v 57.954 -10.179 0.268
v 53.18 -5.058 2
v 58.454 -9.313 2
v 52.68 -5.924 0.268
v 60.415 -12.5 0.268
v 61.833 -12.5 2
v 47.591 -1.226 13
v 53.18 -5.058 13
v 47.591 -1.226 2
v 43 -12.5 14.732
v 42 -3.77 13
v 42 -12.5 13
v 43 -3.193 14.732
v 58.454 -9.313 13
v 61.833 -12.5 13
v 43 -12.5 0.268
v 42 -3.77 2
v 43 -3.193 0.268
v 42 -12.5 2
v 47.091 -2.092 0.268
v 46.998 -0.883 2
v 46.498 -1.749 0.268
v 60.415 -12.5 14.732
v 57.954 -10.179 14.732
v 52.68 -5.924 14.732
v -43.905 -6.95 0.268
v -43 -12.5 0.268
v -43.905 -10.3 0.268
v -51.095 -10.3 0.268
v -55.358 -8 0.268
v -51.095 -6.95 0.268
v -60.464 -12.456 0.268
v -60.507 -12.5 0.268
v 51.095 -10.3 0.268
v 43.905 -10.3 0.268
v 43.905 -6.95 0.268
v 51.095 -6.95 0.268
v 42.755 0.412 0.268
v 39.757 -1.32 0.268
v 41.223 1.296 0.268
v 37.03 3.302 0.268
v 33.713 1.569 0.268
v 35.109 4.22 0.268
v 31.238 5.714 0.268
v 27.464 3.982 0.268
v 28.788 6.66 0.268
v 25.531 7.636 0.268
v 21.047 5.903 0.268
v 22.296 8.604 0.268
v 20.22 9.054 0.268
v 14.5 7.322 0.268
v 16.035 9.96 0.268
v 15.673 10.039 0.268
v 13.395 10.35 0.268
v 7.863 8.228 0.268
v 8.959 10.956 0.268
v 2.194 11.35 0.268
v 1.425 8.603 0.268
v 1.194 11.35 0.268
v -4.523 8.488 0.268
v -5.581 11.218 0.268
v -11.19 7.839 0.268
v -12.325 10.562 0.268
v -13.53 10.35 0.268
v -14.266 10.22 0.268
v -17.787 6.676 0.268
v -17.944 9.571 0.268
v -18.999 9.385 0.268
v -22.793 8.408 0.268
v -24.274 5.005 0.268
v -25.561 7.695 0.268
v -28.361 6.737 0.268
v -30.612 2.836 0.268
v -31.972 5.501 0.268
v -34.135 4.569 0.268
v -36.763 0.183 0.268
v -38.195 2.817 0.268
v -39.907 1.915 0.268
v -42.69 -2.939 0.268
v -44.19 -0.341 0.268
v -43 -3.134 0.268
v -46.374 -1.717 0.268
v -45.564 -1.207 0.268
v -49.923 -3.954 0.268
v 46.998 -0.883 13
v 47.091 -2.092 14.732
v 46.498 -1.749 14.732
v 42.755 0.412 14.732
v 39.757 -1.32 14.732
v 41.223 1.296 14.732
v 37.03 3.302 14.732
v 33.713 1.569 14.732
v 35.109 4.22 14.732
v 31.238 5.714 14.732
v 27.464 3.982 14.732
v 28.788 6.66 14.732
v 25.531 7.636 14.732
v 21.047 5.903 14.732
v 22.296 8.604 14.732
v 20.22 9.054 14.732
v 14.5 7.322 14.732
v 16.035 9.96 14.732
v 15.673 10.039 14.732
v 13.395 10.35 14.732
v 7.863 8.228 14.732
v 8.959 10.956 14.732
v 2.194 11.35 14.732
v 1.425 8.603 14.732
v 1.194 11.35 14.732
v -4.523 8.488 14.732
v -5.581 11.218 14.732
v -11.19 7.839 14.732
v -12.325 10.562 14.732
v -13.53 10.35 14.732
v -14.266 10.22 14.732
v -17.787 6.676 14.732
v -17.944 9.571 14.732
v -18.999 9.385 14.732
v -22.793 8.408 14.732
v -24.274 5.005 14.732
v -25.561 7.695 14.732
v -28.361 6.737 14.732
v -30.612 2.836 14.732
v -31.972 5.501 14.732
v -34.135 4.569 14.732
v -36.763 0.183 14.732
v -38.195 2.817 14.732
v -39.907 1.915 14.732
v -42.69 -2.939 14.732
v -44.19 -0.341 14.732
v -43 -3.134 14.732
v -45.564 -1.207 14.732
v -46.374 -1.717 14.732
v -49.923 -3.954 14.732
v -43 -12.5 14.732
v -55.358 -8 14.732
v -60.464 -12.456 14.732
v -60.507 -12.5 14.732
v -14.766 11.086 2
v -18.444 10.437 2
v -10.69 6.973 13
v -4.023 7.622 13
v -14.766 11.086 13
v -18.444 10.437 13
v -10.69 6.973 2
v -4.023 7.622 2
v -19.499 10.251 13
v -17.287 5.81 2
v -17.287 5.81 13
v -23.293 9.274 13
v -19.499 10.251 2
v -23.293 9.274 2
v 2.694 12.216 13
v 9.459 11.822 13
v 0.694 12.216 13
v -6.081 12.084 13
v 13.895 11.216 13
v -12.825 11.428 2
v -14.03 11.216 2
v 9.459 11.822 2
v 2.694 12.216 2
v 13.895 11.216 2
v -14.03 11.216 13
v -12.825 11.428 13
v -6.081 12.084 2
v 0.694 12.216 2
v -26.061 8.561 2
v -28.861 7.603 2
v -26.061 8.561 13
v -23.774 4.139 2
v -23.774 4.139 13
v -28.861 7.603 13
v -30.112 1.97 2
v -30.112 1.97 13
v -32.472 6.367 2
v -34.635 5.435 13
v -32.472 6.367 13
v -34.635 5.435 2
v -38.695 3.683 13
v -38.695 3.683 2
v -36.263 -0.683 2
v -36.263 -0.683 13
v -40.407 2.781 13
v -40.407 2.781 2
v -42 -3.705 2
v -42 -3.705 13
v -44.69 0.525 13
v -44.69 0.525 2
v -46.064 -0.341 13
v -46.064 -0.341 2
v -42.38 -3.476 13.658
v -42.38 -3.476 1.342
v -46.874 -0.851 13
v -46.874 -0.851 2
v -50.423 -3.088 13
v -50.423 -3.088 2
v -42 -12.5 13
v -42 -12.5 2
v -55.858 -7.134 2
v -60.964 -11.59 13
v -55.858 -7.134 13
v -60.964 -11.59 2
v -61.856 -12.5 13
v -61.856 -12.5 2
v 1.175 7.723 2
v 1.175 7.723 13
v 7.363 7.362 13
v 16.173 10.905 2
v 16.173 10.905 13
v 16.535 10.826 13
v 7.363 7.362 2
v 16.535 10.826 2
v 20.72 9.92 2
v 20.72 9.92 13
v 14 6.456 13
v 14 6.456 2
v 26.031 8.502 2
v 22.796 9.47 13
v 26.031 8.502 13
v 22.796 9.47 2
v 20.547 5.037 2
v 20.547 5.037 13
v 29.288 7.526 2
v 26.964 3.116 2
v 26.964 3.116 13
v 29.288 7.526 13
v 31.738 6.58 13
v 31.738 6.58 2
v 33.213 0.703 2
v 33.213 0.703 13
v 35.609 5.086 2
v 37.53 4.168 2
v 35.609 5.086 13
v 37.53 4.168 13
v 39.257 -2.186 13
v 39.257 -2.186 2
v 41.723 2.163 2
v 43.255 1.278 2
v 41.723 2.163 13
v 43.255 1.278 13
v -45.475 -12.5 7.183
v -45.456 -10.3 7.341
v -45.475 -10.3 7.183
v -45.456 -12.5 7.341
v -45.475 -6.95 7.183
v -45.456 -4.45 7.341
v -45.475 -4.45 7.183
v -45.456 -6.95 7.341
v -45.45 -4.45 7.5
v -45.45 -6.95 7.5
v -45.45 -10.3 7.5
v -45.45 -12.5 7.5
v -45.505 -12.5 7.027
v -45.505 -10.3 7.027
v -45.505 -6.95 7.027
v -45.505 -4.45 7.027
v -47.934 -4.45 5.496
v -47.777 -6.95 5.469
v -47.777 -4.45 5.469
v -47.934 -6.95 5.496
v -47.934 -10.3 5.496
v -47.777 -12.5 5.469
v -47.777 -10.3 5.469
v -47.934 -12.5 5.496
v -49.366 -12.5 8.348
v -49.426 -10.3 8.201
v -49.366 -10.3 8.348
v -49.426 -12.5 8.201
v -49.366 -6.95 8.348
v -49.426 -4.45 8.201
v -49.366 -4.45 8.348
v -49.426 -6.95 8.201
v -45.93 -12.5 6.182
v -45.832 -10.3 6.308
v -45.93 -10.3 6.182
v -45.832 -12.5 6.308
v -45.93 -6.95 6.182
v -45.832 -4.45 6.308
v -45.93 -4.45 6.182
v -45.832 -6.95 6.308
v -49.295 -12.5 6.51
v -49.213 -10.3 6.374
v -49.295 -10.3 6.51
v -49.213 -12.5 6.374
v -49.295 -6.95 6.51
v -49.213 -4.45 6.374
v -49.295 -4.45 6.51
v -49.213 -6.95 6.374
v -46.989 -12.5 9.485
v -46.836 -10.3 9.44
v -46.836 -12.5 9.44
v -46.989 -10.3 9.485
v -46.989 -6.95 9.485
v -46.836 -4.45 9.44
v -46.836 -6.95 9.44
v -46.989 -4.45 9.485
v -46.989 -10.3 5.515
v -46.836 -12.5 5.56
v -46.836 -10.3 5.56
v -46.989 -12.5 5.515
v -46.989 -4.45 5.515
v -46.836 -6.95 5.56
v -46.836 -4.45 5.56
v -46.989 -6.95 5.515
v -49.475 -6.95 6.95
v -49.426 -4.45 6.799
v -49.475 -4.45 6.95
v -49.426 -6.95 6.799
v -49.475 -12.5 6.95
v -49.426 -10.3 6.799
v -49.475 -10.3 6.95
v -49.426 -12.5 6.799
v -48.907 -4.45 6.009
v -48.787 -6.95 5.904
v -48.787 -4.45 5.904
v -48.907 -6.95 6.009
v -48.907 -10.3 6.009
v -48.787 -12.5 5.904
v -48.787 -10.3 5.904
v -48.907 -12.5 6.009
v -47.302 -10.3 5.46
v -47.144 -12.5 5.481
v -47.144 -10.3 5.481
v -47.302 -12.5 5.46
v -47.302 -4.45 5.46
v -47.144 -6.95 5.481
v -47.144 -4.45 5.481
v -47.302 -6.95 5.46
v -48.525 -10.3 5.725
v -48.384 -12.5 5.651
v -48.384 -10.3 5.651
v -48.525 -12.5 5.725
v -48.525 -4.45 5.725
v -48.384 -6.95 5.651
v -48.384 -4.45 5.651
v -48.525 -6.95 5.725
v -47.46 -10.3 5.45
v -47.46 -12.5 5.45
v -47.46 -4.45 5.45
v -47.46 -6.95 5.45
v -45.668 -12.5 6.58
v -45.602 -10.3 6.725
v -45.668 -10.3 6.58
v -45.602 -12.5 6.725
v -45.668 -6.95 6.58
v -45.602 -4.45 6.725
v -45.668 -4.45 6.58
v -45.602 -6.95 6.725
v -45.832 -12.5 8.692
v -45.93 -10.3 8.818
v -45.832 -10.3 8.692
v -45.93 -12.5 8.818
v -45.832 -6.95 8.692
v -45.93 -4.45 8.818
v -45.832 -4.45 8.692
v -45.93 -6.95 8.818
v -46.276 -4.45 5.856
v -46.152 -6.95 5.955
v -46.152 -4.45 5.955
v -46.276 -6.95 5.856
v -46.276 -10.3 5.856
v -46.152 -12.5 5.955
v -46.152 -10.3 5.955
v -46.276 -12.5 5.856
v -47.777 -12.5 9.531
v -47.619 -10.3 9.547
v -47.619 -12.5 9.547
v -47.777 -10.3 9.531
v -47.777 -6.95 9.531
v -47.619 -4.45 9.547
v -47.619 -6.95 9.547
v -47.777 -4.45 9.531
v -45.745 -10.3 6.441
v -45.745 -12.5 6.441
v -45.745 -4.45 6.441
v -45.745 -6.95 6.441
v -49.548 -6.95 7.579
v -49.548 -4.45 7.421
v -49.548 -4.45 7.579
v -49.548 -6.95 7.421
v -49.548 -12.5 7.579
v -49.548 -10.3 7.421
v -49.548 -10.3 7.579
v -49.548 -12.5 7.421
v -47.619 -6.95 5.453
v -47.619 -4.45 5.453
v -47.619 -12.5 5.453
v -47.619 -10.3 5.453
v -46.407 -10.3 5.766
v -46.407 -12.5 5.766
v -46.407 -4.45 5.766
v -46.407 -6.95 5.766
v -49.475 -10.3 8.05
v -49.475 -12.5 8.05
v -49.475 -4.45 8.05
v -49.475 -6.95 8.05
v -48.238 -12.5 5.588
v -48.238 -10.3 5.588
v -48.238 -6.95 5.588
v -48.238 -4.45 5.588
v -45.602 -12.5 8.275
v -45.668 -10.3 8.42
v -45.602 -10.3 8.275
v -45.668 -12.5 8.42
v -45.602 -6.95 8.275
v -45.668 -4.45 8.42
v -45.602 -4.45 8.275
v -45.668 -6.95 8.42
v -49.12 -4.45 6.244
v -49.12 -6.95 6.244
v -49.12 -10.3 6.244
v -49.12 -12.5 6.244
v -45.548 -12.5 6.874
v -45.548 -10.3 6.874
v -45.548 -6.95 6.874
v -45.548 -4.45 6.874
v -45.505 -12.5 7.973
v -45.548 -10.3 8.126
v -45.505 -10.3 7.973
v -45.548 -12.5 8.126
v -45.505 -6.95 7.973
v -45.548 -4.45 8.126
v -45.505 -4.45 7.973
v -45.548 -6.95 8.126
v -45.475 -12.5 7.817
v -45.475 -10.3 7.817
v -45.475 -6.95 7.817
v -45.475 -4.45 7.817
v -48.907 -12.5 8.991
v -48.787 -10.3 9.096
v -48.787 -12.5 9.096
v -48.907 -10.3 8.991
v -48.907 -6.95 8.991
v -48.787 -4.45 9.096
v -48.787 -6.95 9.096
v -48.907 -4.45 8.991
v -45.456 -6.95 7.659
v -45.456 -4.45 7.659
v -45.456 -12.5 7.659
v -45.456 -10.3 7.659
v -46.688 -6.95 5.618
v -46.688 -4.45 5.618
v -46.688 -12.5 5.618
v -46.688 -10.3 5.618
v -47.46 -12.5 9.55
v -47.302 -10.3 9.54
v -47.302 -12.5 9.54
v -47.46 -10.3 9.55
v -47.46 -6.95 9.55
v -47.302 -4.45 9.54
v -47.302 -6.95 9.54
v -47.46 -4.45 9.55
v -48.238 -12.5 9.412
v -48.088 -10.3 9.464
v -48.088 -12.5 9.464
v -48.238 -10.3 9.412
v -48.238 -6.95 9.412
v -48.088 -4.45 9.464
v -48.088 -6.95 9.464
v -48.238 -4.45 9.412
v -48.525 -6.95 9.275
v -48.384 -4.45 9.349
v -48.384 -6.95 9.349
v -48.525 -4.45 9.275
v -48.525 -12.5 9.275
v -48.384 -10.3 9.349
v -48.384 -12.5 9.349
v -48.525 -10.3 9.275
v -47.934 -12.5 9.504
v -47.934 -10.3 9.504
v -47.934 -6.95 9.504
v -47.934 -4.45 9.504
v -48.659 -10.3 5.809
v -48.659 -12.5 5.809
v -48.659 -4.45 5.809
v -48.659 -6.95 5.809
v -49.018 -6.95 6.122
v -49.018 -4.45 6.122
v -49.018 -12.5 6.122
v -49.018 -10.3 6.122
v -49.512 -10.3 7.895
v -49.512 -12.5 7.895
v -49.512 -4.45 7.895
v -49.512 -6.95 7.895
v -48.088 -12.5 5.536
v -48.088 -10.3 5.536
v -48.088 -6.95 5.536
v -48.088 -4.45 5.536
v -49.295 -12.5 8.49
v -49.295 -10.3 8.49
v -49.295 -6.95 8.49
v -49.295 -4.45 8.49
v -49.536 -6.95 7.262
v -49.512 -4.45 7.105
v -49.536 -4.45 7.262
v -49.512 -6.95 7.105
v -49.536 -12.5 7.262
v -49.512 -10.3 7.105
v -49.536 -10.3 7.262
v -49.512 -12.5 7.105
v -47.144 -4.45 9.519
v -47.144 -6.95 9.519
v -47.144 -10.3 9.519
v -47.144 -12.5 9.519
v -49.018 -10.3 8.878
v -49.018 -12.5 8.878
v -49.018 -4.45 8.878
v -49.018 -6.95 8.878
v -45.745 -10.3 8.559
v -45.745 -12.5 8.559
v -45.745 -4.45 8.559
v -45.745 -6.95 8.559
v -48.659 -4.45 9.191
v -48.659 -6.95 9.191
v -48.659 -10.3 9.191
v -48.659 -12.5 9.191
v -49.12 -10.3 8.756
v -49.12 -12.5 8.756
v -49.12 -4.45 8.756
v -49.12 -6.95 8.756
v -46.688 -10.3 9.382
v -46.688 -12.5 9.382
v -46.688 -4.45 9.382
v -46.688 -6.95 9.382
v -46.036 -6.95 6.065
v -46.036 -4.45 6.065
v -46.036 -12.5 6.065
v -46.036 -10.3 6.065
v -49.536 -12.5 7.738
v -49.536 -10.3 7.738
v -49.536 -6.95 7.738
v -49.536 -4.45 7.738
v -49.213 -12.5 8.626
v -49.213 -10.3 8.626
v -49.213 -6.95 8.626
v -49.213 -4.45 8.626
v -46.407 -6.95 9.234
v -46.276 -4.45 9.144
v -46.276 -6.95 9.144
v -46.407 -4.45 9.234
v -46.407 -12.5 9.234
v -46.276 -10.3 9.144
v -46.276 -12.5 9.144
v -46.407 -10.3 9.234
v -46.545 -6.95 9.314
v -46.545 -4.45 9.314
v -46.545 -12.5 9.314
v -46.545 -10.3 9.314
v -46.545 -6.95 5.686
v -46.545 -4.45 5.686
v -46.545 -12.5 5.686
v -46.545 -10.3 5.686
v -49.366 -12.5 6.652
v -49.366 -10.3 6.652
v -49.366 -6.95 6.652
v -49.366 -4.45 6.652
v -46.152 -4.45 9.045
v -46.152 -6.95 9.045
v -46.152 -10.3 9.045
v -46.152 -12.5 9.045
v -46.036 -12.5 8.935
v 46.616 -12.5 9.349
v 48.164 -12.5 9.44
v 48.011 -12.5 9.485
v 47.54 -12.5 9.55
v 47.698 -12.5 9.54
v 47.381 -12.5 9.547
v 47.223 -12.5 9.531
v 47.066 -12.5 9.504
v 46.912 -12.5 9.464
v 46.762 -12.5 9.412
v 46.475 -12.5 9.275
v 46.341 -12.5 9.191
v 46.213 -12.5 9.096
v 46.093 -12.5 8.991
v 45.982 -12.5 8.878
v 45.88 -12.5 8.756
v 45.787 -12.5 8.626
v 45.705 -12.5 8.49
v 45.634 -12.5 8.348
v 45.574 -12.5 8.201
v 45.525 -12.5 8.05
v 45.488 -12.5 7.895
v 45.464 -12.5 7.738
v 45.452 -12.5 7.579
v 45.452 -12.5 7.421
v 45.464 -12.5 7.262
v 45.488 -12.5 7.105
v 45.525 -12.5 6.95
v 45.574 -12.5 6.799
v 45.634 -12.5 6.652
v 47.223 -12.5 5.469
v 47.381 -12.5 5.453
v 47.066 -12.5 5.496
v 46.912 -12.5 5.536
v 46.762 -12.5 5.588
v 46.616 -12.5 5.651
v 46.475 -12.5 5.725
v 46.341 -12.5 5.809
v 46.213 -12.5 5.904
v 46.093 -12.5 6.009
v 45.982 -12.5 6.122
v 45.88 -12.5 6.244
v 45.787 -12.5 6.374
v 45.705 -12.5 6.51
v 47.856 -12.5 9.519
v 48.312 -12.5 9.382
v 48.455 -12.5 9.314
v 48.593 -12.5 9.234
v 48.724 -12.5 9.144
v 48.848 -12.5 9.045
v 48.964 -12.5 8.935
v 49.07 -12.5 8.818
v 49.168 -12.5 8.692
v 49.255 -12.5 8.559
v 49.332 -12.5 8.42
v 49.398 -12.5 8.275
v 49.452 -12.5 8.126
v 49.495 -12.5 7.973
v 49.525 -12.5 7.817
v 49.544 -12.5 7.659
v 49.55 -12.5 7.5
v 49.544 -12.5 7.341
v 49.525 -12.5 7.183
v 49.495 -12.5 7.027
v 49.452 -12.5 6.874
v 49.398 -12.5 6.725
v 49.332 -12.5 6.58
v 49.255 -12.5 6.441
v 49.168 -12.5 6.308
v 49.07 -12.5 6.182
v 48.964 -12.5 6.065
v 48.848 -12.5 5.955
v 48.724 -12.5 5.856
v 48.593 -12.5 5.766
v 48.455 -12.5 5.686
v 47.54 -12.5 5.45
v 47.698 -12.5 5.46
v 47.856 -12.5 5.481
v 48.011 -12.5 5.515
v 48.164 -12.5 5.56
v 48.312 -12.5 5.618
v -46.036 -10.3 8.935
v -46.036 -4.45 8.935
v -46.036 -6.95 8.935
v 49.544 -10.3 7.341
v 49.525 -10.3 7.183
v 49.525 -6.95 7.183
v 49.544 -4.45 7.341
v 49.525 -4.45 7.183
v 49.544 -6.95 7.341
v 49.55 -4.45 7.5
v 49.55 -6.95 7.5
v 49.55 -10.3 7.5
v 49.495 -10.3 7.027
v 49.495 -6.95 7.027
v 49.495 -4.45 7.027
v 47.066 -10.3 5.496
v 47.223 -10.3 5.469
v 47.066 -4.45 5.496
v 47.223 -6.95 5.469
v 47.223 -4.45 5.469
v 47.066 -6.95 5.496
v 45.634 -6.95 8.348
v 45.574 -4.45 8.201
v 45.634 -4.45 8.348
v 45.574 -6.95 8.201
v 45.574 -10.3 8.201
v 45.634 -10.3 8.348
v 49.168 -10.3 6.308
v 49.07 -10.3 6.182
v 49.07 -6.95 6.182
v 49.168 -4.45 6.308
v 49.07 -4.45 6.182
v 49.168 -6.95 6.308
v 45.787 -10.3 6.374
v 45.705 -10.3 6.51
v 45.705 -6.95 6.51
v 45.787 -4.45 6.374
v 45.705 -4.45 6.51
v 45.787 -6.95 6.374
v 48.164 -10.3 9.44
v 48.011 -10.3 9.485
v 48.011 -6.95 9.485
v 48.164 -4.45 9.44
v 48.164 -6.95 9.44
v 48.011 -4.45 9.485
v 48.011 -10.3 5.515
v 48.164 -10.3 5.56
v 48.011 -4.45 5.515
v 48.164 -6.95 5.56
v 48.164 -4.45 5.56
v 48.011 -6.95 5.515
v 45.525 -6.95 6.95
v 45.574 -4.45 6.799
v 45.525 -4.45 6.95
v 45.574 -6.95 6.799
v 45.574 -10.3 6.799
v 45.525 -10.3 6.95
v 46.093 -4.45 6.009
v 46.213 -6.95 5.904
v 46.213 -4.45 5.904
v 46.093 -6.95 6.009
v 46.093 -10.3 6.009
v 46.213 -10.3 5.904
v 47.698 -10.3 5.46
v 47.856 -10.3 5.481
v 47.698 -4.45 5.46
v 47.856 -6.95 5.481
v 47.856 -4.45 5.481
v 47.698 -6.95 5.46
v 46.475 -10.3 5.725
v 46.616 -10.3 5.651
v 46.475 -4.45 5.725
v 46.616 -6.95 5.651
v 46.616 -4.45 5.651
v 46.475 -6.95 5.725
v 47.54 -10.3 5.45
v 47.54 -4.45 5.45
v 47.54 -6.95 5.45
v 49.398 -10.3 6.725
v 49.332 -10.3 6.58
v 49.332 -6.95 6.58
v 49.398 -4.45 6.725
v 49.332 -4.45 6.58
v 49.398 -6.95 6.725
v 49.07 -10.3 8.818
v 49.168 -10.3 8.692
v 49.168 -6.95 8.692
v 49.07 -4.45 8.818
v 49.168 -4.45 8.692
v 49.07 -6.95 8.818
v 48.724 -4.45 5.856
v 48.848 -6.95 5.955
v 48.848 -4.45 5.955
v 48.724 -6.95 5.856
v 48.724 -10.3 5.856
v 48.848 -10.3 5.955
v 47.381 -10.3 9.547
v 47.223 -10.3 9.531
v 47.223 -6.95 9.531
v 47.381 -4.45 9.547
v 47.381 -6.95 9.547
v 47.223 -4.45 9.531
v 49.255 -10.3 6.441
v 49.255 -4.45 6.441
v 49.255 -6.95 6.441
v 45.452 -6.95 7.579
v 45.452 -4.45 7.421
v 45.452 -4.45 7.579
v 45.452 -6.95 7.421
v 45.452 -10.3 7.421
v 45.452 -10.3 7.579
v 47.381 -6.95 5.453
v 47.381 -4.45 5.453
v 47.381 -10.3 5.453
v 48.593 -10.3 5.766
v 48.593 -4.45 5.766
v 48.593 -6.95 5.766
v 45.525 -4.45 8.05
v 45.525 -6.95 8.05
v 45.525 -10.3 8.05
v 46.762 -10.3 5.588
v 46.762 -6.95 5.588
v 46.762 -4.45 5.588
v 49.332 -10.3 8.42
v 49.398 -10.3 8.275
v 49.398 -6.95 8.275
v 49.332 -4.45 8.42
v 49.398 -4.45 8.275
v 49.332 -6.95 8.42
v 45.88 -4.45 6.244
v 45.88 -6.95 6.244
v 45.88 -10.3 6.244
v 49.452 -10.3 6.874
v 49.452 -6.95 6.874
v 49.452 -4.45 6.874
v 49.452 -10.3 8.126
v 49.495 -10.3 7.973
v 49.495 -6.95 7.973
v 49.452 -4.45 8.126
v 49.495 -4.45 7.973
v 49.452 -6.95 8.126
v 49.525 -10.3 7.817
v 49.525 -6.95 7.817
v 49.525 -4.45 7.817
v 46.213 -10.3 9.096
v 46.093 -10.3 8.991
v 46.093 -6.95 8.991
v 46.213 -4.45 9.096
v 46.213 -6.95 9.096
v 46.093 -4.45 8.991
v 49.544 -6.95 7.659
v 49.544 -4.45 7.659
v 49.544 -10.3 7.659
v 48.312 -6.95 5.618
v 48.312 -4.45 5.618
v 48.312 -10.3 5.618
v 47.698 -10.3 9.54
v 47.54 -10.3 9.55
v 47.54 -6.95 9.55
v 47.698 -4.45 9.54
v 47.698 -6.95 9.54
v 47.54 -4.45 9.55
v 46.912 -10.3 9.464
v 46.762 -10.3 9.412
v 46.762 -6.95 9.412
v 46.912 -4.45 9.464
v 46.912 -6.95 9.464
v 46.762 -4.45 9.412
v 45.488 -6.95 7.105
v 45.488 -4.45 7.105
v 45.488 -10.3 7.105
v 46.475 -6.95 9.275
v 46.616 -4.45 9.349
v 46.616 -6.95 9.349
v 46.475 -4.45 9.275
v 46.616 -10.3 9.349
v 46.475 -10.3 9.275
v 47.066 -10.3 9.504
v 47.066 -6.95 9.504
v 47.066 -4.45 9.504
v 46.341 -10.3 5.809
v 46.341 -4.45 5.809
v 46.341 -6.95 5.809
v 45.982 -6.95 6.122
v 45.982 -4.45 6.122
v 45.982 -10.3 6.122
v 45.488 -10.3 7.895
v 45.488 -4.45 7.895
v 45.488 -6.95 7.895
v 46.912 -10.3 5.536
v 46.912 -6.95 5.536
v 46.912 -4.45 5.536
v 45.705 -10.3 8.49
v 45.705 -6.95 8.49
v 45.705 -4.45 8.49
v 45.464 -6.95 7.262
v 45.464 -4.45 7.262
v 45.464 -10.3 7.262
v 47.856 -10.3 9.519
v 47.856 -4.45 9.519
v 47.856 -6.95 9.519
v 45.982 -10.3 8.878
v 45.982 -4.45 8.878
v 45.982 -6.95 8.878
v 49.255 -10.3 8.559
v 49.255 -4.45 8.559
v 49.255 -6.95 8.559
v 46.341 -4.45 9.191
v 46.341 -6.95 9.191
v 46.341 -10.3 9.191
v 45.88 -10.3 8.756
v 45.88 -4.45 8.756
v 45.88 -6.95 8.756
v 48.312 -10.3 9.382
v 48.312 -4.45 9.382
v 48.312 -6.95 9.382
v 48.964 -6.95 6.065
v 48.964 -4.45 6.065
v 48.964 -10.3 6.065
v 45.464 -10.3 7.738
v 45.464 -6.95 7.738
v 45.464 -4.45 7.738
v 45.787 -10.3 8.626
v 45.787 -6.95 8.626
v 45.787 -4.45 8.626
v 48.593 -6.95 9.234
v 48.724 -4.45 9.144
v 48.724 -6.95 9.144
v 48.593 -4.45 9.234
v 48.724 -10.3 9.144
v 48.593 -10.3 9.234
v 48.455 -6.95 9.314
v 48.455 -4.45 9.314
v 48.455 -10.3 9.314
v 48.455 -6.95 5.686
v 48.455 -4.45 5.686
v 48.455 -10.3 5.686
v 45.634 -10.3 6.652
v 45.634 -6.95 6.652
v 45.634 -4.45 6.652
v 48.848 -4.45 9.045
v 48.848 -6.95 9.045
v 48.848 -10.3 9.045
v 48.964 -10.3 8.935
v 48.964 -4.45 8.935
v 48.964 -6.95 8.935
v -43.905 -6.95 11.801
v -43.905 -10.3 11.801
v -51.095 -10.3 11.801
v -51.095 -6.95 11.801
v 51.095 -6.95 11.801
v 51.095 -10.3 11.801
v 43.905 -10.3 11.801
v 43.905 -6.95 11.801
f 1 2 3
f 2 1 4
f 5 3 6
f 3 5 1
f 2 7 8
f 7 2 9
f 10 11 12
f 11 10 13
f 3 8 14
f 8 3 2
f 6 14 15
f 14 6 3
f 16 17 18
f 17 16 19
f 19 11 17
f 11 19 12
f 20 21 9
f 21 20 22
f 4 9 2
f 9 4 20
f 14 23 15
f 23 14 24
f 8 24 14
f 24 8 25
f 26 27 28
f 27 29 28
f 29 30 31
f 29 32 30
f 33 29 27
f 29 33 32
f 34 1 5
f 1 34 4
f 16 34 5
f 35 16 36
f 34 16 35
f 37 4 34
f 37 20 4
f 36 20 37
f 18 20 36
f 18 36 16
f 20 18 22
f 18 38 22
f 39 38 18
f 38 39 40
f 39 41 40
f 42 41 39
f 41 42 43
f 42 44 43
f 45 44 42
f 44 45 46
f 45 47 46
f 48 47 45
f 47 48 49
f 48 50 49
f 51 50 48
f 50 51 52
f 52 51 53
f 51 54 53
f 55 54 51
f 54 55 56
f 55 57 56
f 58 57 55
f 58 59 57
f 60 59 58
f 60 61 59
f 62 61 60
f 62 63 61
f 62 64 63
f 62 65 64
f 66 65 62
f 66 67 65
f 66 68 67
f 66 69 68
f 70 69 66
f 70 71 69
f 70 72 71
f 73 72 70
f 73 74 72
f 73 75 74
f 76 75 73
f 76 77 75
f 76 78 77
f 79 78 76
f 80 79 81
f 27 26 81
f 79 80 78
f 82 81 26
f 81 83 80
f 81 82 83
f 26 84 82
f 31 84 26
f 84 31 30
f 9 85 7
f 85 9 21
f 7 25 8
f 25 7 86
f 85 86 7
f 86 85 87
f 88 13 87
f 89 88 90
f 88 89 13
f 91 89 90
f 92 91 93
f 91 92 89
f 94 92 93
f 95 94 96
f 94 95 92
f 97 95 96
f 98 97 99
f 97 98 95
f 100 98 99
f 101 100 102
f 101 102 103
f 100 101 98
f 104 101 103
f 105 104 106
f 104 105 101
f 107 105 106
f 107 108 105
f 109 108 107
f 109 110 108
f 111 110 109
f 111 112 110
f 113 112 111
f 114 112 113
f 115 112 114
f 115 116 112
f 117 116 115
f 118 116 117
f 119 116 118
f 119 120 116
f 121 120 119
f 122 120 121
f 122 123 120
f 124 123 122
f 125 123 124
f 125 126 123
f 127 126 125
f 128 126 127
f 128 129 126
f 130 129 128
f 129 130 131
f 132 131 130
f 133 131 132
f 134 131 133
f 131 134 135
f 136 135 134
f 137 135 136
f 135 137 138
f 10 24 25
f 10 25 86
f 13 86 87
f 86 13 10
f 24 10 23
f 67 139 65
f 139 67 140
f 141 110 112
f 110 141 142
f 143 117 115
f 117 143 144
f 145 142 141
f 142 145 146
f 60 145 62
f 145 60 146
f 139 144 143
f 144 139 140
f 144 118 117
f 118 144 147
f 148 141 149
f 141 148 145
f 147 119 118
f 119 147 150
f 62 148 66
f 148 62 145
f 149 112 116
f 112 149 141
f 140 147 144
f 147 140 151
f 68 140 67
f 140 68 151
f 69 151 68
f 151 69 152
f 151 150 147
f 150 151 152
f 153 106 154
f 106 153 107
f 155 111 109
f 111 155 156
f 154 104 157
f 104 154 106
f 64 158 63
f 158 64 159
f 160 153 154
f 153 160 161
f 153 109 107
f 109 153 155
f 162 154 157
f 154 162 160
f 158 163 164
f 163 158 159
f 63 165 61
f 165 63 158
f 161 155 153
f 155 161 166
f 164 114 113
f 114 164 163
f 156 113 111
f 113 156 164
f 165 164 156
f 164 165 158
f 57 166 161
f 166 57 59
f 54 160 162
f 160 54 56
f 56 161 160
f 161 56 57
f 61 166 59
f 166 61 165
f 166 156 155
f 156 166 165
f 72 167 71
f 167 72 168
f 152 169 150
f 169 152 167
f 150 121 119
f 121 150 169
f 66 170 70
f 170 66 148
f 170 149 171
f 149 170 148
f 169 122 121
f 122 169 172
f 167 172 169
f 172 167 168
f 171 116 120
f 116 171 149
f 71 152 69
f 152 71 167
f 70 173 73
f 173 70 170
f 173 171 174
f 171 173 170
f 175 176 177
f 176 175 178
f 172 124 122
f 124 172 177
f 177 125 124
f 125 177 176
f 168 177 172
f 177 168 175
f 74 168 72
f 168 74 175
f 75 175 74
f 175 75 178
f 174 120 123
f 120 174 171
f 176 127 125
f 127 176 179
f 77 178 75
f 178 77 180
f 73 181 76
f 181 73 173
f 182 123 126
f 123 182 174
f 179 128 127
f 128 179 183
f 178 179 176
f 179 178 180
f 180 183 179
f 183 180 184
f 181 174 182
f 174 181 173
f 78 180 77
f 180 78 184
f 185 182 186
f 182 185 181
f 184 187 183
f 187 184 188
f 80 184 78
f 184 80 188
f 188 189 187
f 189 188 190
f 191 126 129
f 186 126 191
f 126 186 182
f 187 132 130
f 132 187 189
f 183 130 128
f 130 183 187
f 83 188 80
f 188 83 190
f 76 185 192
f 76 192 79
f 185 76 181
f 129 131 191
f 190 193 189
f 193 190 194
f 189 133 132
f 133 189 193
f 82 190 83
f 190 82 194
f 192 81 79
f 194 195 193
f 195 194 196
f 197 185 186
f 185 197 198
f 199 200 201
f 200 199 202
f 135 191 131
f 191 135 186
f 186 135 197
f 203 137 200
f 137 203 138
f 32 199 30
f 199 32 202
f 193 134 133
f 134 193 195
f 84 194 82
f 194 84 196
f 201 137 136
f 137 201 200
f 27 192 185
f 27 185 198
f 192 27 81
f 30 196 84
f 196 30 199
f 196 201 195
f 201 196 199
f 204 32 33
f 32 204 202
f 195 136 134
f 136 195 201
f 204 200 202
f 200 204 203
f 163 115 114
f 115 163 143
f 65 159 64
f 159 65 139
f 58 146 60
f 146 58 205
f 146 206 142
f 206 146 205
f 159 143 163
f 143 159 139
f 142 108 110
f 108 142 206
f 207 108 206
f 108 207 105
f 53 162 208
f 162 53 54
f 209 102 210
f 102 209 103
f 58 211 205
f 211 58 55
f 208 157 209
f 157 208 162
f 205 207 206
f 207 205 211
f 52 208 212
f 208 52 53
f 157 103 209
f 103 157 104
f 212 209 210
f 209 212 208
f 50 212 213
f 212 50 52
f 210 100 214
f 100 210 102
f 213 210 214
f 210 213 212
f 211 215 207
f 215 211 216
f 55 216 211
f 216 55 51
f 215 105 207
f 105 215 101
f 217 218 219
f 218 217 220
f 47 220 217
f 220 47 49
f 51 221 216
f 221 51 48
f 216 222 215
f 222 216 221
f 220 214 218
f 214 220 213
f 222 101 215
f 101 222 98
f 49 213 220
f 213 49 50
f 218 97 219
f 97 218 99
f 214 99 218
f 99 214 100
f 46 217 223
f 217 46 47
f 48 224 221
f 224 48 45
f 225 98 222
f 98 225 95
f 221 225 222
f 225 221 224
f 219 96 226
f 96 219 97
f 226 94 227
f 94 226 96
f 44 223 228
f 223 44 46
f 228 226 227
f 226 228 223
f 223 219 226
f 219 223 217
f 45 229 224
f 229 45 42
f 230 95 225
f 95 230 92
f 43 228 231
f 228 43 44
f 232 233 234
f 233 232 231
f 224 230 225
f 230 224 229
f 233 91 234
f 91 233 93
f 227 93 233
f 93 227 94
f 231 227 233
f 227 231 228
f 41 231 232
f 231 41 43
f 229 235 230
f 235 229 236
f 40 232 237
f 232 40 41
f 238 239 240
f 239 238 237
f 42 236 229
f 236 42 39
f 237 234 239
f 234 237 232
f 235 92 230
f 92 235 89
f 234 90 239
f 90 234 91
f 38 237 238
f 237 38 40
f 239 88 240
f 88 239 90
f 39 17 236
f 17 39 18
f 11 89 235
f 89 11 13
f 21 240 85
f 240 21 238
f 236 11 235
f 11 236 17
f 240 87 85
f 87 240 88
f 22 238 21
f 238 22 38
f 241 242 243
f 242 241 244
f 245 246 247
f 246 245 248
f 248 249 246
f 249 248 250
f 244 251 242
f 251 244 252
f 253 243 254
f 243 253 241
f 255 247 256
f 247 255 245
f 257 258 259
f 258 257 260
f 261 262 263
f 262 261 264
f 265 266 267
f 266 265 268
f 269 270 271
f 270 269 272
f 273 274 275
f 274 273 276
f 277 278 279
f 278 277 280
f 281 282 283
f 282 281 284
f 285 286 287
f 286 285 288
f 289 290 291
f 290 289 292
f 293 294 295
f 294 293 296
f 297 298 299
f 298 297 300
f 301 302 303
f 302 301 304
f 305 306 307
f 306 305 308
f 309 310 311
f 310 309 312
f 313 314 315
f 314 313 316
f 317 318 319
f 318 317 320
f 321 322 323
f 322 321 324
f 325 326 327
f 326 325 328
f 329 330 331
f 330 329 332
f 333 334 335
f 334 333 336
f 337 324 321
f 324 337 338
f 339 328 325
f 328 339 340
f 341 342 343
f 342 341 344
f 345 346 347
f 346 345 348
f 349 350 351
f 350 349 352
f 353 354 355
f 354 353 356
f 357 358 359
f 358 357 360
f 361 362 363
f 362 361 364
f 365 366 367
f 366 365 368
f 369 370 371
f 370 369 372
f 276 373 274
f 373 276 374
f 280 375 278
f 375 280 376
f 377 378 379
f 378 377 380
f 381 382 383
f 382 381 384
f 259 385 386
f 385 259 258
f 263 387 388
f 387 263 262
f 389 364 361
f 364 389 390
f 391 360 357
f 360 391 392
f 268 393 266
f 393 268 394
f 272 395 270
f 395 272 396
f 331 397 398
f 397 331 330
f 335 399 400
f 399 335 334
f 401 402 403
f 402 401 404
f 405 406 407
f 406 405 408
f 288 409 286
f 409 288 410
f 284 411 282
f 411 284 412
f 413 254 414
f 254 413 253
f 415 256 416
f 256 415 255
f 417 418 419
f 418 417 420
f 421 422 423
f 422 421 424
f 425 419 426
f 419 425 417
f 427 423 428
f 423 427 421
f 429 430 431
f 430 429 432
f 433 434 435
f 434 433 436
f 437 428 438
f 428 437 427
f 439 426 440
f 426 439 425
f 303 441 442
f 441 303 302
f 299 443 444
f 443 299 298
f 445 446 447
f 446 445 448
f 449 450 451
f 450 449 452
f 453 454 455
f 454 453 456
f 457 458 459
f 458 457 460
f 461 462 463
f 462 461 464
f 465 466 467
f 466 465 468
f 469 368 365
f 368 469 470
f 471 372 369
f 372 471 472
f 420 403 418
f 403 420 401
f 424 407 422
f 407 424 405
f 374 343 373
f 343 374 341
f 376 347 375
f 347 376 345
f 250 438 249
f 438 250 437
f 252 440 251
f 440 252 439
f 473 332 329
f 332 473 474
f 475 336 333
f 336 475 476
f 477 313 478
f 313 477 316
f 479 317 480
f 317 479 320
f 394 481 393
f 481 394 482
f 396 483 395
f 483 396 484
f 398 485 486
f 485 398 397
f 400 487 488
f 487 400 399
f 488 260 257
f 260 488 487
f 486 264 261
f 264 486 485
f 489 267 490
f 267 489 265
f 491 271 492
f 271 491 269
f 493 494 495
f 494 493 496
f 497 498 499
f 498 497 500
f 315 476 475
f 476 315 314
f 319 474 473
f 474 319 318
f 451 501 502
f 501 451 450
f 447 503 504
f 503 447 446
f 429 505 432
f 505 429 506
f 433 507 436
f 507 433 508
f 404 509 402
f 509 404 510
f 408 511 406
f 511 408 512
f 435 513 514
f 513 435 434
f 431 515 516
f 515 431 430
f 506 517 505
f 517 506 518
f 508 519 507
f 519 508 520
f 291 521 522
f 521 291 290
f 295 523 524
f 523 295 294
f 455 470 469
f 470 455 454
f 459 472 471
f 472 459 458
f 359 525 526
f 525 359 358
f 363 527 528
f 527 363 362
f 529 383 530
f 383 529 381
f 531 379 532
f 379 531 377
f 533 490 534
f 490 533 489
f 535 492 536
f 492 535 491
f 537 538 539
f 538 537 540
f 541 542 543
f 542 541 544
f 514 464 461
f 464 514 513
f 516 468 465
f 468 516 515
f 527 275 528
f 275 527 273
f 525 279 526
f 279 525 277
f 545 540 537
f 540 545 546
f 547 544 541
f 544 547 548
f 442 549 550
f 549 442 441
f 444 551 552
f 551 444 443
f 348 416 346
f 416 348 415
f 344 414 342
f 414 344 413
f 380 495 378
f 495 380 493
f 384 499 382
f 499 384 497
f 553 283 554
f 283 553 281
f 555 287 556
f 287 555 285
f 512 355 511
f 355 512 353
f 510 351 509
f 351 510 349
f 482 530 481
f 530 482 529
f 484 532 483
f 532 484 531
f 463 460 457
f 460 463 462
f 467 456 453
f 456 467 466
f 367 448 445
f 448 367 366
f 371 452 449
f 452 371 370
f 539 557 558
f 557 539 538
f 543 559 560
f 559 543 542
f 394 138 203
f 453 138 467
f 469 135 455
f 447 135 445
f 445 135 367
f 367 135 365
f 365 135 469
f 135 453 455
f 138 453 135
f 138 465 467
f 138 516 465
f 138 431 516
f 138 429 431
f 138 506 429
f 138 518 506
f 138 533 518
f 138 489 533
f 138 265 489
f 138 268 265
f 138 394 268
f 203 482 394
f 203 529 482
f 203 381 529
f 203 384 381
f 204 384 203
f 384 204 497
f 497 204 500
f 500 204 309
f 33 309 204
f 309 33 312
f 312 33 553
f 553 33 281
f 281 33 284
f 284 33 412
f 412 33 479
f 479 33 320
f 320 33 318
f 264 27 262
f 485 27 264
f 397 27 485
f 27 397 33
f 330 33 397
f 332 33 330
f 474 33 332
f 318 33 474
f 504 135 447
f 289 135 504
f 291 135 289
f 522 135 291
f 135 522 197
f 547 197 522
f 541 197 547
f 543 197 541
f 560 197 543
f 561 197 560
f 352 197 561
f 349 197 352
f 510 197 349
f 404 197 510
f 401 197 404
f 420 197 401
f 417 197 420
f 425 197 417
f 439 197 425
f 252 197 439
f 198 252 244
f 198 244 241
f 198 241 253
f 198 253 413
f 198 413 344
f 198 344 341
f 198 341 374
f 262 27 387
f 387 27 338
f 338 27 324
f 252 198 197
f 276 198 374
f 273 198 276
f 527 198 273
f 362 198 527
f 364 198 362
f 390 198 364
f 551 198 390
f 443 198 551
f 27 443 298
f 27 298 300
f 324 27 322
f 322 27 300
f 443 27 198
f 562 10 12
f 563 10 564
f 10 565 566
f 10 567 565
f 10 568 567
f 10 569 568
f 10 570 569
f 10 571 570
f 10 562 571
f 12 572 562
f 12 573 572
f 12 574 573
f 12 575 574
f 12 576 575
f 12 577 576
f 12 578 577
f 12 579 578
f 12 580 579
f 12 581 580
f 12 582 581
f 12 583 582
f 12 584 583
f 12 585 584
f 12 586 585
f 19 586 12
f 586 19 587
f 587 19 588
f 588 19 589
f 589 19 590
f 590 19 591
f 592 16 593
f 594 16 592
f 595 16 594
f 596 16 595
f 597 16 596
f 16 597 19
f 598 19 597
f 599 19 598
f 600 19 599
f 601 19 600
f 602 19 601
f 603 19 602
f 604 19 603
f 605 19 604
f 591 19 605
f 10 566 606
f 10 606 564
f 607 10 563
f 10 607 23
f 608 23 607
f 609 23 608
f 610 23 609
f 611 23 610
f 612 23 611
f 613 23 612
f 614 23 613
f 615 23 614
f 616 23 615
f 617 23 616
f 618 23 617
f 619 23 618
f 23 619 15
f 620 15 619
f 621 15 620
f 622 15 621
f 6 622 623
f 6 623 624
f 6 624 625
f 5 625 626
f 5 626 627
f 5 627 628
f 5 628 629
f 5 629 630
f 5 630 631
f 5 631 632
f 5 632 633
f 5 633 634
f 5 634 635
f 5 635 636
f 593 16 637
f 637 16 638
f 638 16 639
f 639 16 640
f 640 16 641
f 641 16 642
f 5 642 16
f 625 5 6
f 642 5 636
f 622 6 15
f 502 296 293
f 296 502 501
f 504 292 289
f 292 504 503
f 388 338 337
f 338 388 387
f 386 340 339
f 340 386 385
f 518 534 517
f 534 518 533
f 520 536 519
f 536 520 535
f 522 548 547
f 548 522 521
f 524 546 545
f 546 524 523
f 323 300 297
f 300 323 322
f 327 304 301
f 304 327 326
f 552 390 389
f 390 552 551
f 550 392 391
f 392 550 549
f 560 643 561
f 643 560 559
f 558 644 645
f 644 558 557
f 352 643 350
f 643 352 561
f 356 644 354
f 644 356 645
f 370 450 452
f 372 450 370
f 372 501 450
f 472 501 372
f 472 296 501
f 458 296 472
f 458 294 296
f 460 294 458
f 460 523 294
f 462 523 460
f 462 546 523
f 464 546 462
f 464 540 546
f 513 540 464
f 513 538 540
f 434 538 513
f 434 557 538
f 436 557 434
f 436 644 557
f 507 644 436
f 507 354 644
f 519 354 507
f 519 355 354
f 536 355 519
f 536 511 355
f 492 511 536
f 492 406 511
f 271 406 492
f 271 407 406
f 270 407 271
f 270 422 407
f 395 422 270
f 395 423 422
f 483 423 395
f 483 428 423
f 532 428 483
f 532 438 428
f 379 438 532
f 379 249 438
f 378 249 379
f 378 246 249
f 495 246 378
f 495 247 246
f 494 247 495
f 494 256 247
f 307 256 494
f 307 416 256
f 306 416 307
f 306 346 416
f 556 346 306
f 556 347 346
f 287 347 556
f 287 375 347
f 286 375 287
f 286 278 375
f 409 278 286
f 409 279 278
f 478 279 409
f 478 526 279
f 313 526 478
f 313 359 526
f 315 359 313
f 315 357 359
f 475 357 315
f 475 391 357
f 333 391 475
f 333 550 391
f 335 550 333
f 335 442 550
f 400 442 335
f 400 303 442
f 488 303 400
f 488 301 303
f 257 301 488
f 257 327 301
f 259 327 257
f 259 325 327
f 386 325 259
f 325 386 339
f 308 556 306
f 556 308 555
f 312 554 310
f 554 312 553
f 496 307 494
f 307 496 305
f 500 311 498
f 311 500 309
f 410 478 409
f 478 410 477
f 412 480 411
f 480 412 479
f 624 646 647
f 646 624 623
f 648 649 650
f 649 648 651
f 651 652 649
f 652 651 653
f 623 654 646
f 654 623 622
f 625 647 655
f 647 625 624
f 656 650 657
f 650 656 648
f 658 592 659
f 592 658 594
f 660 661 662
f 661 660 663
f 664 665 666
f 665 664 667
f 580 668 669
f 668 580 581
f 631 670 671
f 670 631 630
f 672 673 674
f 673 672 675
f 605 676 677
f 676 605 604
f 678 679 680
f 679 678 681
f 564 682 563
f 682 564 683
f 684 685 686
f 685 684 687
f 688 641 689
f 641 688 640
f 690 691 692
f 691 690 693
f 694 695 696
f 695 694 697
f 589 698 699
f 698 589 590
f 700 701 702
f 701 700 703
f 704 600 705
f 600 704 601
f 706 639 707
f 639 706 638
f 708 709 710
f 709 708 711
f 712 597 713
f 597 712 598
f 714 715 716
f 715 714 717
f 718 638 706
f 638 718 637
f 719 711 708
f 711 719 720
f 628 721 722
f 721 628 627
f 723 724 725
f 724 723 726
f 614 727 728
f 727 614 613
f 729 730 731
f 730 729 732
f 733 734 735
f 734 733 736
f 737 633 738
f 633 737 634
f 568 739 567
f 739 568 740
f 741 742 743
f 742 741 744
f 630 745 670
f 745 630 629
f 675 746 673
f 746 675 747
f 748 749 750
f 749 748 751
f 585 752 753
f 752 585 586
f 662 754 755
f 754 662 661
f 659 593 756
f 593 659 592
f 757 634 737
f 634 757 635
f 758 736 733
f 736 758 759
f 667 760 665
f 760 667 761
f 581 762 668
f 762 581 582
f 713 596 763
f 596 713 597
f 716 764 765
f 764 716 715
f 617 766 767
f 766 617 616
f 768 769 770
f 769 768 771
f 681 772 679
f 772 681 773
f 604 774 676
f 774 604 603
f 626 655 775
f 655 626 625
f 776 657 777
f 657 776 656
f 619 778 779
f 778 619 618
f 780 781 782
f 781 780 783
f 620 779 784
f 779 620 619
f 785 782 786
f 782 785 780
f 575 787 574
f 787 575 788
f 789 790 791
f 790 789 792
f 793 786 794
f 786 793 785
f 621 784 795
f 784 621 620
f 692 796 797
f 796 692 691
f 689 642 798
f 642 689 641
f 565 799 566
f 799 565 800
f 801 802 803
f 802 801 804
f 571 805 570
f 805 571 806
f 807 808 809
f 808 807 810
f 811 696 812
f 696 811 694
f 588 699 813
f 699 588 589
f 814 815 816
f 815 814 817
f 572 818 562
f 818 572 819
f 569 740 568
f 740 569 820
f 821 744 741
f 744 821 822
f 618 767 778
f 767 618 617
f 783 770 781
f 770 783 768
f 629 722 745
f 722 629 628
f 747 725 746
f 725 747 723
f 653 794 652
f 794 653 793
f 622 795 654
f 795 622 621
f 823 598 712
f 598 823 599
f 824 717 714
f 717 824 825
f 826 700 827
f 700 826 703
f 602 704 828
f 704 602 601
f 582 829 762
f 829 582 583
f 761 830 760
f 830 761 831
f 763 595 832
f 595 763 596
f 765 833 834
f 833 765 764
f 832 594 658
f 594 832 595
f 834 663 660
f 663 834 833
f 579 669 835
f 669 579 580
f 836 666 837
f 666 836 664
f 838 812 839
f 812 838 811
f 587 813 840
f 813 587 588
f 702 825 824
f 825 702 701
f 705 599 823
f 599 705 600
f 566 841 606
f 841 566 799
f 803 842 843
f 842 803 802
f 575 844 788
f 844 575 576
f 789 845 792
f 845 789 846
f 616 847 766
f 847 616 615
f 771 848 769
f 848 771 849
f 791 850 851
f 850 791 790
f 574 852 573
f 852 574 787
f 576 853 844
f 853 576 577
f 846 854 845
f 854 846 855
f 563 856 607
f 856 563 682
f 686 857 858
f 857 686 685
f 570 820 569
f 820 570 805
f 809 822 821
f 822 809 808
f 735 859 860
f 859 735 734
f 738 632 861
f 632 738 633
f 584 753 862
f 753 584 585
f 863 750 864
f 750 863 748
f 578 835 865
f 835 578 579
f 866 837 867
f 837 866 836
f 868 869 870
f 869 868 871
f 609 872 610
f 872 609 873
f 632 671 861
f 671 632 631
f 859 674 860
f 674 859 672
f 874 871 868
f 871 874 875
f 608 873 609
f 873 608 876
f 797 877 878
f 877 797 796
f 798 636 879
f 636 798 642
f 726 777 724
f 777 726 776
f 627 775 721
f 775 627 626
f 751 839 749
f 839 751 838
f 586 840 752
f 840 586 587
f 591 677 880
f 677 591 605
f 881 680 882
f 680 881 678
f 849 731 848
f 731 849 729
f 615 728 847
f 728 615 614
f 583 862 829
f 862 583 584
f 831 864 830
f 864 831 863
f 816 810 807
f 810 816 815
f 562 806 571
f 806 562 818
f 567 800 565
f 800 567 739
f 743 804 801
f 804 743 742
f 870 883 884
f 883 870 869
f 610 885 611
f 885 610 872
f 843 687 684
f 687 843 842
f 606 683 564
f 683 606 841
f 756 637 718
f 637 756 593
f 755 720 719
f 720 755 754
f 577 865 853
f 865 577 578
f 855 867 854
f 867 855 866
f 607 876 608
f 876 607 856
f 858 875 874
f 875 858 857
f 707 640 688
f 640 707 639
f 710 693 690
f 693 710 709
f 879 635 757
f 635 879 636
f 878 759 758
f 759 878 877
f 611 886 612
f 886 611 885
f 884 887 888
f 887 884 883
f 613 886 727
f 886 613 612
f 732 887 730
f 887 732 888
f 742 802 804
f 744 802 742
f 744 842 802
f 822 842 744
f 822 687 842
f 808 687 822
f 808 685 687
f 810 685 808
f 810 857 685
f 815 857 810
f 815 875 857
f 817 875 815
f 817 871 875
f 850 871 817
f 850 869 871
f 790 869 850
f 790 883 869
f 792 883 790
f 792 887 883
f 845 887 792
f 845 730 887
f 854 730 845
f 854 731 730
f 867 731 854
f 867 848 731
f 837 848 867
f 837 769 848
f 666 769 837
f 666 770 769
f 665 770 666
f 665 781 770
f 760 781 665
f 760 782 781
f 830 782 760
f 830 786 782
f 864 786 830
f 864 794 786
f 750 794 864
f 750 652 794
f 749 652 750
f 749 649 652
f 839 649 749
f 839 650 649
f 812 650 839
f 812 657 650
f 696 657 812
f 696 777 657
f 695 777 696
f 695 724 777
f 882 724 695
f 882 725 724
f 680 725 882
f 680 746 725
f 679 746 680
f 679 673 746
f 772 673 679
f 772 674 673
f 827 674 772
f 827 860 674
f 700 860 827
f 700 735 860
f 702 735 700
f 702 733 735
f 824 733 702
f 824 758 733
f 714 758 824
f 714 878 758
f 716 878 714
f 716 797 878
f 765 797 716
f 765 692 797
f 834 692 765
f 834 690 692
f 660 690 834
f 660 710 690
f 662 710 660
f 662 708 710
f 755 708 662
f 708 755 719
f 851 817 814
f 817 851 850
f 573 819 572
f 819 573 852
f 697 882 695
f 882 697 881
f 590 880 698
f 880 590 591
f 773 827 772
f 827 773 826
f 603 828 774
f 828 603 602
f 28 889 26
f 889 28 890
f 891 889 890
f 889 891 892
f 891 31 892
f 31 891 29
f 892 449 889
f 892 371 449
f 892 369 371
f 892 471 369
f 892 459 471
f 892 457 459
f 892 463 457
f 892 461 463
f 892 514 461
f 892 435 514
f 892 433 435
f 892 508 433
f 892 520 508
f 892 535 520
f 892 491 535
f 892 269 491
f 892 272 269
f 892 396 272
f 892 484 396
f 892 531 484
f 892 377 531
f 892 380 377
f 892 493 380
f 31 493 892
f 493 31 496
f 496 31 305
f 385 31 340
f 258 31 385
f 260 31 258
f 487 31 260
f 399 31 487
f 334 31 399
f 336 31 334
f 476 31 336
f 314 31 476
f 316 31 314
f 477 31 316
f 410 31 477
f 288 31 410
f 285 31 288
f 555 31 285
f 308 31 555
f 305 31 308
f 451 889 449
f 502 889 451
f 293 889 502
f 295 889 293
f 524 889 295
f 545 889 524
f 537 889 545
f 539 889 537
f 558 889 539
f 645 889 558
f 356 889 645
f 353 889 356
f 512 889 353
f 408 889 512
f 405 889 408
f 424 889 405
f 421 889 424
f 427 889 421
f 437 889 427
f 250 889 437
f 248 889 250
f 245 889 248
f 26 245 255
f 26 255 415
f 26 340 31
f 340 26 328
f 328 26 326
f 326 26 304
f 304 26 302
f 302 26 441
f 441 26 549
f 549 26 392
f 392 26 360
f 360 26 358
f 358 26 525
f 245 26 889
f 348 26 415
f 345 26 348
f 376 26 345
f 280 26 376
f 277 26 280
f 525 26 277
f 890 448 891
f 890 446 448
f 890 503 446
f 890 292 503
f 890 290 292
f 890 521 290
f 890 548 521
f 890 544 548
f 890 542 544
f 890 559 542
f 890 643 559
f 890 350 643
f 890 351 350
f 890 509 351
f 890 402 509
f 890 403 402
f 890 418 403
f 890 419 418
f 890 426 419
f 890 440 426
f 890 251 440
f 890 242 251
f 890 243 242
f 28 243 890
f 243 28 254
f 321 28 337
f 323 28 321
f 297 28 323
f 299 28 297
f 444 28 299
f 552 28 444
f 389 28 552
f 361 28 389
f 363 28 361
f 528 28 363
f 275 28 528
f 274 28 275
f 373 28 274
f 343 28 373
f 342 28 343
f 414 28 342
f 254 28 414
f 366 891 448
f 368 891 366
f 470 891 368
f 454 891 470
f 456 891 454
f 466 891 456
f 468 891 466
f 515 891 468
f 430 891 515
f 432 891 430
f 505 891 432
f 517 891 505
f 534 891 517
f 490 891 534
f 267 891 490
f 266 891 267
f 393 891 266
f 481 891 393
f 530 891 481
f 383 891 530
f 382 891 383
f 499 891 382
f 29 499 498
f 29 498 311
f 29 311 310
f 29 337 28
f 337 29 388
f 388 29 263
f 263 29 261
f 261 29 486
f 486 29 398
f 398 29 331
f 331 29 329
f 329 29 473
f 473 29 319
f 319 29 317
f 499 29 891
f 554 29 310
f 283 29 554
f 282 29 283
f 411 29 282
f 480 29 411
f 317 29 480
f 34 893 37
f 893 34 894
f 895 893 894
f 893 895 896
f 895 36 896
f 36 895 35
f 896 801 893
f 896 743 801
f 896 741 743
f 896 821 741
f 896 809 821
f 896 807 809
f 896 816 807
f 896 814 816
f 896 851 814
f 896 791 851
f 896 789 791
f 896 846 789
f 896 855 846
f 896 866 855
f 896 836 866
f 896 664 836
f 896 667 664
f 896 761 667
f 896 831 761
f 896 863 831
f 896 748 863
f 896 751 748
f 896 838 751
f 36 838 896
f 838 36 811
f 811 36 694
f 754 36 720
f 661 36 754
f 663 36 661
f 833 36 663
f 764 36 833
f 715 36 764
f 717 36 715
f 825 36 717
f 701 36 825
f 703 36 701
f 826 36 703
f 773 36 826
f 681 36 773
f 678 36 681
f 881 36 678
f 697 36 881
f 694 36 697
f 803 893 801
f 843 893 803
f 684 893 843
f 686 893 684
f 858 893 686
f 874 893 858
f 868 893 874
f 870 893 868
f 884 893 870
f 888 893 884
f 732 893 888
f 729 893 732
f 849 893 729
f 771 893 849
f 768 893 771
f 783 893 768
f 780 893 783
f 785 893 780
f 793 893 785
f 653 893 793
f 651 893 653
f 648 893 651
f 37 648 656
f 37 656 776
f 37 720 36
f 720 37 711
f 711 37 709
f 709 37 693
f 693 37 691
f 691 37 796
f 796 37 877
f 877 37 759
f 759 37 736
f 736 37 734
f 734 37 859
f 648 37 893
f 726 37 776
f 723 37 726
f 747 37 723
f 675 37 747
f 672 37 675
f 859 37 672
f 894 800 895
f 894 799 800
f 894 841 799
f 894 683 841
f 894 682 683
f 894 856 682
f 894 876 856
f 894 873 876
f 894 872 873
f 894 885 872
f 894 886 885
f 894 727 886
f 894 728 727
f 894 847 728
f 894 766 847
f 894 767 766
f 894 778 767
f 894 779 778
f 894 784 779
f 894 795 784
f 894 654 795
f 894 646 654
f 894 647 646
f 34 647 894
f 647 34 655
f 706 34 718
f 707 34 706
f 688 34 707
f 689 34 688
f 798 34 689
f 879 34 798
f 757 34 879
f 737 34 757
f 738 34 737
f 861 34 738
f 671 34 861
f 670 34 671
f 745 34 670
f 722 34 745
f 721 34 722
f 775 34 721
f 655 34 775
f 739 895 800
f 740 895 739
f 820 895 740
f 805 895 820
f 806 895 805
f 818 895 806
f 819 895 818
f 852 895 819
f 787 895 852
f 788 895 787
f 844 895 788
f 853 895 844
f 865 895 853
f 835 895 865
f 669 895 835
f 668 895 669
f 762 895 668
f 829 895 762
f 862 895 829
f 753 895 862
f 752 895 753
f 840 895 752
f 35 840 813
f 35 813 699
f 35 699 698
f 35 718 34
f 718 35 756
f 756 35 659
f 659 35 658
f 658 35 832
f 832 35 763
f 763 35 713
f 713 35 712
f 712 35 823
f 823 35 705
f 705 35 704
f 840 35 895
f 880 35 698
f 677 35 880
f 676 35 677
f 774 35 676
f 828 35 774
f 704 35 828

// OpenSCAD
/* Cabinet/Drawer Handle
   by Lyl3

Create a simple circular arc shaped handle for cabinets, cupboards, or drawers.

This code is published at:
https://www.thingiverse.com/thing:3911914
licensed under the Creative Commons - Attribution - Share Alike license (CC BY-SA 3.0)

V0.1 - basic working prototype with math worked out
V0.2 - filleted edges
V0.3 - added screw hole and nut hole
V0.4 - fine-tuning, set sane ranges for parameters
V0.5 - added tolerance parameters for the holes
V0.6 - fine-tuned ranges
V0.7 - added parameter and code to create test piece instead of whole handle.
V0.8 - added parameter and code to create nut hole plugs
V1.0 - removed the brim from the nut hole plugs
       ready for release
V1.1 - set resolution based on length of arc      
V1.2 - fixed calcualtion for mount radius
V1.3 - mount plate extended across handle, option for single screw hole or two screw holes
V1.4 - fine-tuning the math, set sane parameter ranges
V1.5 - added "mount pillars" to the design, made code more efficient, fixed math bugs
V1.6 - simplified code using 2D instead of 3D for the handle profile
V1.7 - added spherical-shaped handle option, moved back of handle to XZ plane, simplifying transformations
V1.8 - backplate all the way across the back for spherical handles
V1.9 - scaled height to allow handles shaped like spheroid sections instead of spherical sections
V2.0 - used cavity length parameter for spheroidal handles
V2.1 - fixed documentation, default parameter values
*/

/* [Handle parameters] */

// Resolution of arcs and circles. Set this to a low value to speed up processing while adjusting parameters and previewing them. Set to 1 for creating an STL mesh to be printed. Set it greater than 1 if you have a fast processor and want a super smooth mesh. 
resolution = 0.2; // [0.2:0.1:1.5]


// Type of handle: cylindrical or spheroidal
handleType = "cylindrical"; // [cylindrical,spheroidal]

// Part to create: whole handle, test piece for testing dimensions of holes, or nut hole plug(s) (to cover holes if handle will be mounted vertically)
createPart = "handle"; // [handle,test piece,nut hole plugs]
createTestPiece = (createPart=="test piece") ? true : false;
createNutHolePlugs = (createPart=="nut hole plugs") ? true : false;

// Length of the handle (mm)
handleLength = 124; // [30:0.1:300]

// Length of the cavity in the handle (mm)
cavityLength = 84; // [15:0.1:250]

// Height of the handle (oriented as it would be on a drawer) (mm)
handleHeight = 15; //[5:0.1:60]

// Depth of the handle (amount it protudes from the drawer or cupboard) (mm)
handleClearance = 25; // [20:0.1:50]

// Thickness of the handle (in the middle where you would grab it) (mm)
handleThickness = 5; // [3:0.1:15]

// Thickness of the back mounting plate (mm)
backplateThickness = 0; // [0:0.1:15]

// Radius of filleted edge (0 for no fillet) (mm)
fillet = 2; // [0:0.01:5]

/* [Screw Hole Parameters] */

// Number of screws
screwCount = 2; // [1:2]

// Distance between screws if two screws, ignored if only one screw (mm)
screwDistance = 95; // [1:0.1:250]

// Diameter of screw (mm). An M4 screw has a nominal diameter of 4 mm.
screwDiameter = 4; // [1:0.01:10]

// Length of screw hole (mm)
screwHoleLength = 8; // [2:0.1:25]

// Tolerance added to walls for the screw hole (mm). This is added to all sides of the hole: a screw diameter of 3 mm with tolerance of 0.05 mm would make the hole diameter 3.1 mm. 
screwHoleTolerance = 0.05;  // [0:0.01:0.2]

screwHoleDiameter = screwDiameter + 2*screwHoleTolerance;
screwHoleDepth = screwHoleLength + screwHoleTolerance;

/* [Nut Hole Parameters] */

// Create holes for inserting nuts?
withNutHoles = "yes"; // [yes,no]
createNutHoles = (withNutHoles=="yes") ? true : false;

// Distance from back of handle to the hole for inserting a nut (mm)
nutHoleOffset = 2.2; // [1:0.1:25]

// Width of nut across flats (between parallel sides) (mm). The ANSI M4 nut specification maximum is 7.00 mm and the minimum is 6.78 mm. The default of 6.89 is the average. 
nutWidth = 6.89; // [3:0.01:16]

// Thickness of nut (mm). The ANSI M4 nut specification maximum is 3.20 mm and the minimum is 2.90 mm. The default of 3.05 is the average. 
nutThickness = 3.05; // [1:0.01:12]

// Tolerance added to walls for the nut hole (mm). This is added to all sides of the hole: a nut width of 6 mm with a tolerance of 0.15 mm would make the nut hole width 6.3 mm. It doesn't have to be a tight fit, so the tolerance can be a bit loose.
nutHoleTolerance = 0.15;  // [0:0.01:0.2]

nutHoleWidth = nutWidth + 2*nutHoleTolerance;
nutHoleHeight = nutThickness + 2*nutHoleTolerance;
nutHoleDepth = handleHeight/2+nutHoleWidth/sqrt(3)+nutHoleTolerance;

/* [Advanced] */

/* [Hidden] */
fudge = 0.0001; // Value added or subtracted to various values to ensure each part is a single manifold mesh 
bigFudge = 5; // Large value to help debug boolean operations in conjunction with the debug modifer

/* Math references:
   https://en.wikipedia.org/wiki/Circular_segment
   https://en.wikipedia.org/wiki/Inscribed_angle
   https://en.wikipedia.org/wiki/Inverse_trigonometric_functions
*/
outerChord = handleLength;

outerRadiusActual = (handleClearance/2) + (outerChord*outerChord/8/handleClearance);

// Calculate the circle fragments based on the arc length and the  ratio of the arc to circumference
outerDiameter = 2*outerRadiusActual;
arcLength = (handleClearance < outerDiameter/2)
   ? PI/180 * asin(outerChord/outerDiameter) * outerDiameter
   : (PI - PI/180*asin(outerChord/outerDiameter)) * outerDiameter;
arcCircleRatio = arcLength / (outerDiameter * PI);
$fn = 100*resolution / arcCircleRatio; 

outerRadius = outerRadiusActual - fillet;
innerRadius = outerRadiusActual - handleThickness + fillet; 

sphereHandleHeight = sqrt( outerRadiusActual*outerRadiusActual - ((outerRadiusActual-handleClearance) * (outerRadiusActual-handleClearance))) ;
sphereHeightScale = handleHeight / sphereHandleHeight;

cutterCube = max(1,sphereHeightScale) * max(2*outerRadiusActual,handleHeight) + bigFudge; // Make cut cube large enough 

echo("Outer chord:",outerChord, "\nOuter diameter:",outerDiameter, "\nHandle clearance:",handleClearance, "\nArc length:",arcLength, "\nArc circle ratio:",arcCircleRatio, "\nSphere Height Scale",sphereHeightScale, "\n$fn:",$fn);

/*
Module to create the 2D handle shape, centered at X=0
*/

module handle_profile() {
  translate([0,-outerRadius+handleClearance-fillet,0])
  difference() {  // Create the 2D handle shape.
    circle(outerRadius);  // outer circle
    intersection() {
      circle(innerRadius);  // inner circle
      square([cavityLength+2*fillet, cutterCube],center=true);  // cavity
          translate([0,outerRadius-handleClearance/2+backplateThickness-fudge,0])  // "negative" of back plate, fudge factor required when backplateThickness=0
            square([outerChord+bigFudge, handleClearance], center=true);
    }
    // Have it extended a little (the fillet radius) beyond where the final cut will be made later,
    // so that the minkowski function covers the area all the way to the sides.
    translate([-cutterCube/2,-cutterCube+outerRadiusActual-handleClearance-fillet,0]) square(cutterCube);
  }
}
// %linear_extrude(0.0001) handle_profile();

/*
Create the part(s)
*/
//color("SteelBlue")
if (createNutHolePlugs) {
  if (screwCount == 1) {
    translate([0,0,1]) cube([nutWidth,nutThickness,2],center=true);
  } else {
    translate([-nutWidth-1,-nutThickness/2,0]) cube([nutWidth,nutThickness,2]);
    translate([1,-nutThickness/2,0]) cube([nutWidth,nutThickness,2]);
  }
}
else
{
  translate([0,-handleClearance/2,fillet])
  difference() {
      if (handleType == "spheroidal") {
        union() {
          intersection() { // Create the backplate shaped to the spheroid
            translate([0,handleClearance-outerRadiusActual,0]) scale([1,1,sphereHeightScale]) sphere(outerRadiusActual-handleThickness/2);
            translate([-cutterCube/2,0,-fillet]) cube([cutterCube, backplateThickness, cutterCube]);
          }
          intersection() { // Create the spheroidal shape
            translate([0,handleClearance-outerRadiusActual,0]) scale([1,1,sphereHeightScale]) difference() { 
              sphere(outerRadiusActual);
                intersection() {
                  sphere(outerRadiusActual-handleThickness);
                  cube([cavityLength, cutterCube, cutterCube],center=true);
                }
            }
            translate([-cutterCube/2,0,0]) cube([cutterCube, cutterCube, cutterCube]);
          }
          intersection() { // Create the filleted edge on the bottom
            minkowski() { 
              linear_extrude(0.001) handle_profile();
              sphere(fillet,$fn=30*resolution);
            }
            translate([-cutterCube/2,0,-fillet]) cube([cutterCube, cutterCube, fillet]);
          }
        }
      } else {
    // Create the filleted handle
    minkowski() { 
      linear_extrude(handleHeight - 2*fillet) handle_profile();
      sphere(fillet,$fn=30*resolution);
      }
    }
    // cut away material added by fillet at the back of the handle
    translate([-cutterCube/2,-cutterCube,-cutterCube/2+handleHeight/2-fillet]) cube(cutterCube);
    // cut out the screw hole(s)
    if (screwCount == 1) {
      translate([0,0,handleHeight/2-fillet]) rotate([-90,0,0]) cylinder(h=screwHoleDepth+fudge, d=screwHoleDiameter);
    } else {
      translate([-screwDistance/2,0,handleHeight/2-fillet]) rotate([-90,0,0]) cylinder(h=screwHoleDepth+fudge, d=screwHoleDiameter);
      translate([screwDistance/2,0,handleHeight/2-fillet]) rotate([-90,0,0]) cylinder(h=screwHoleDepth+fudge, d=screwHoleDiameter);
    }
    // cut out the nut holes
    if (createNutHoles) {
      if (screwCount == 1) {
        translate([-nutHoleWidth/2,nutHoleOffset,-fillet-fudge]) cube([nutHoleWidth,nutHoleHeight,nutHoleDepth]);
      } else {
        translate([-screwDistance/2-nutHoleWidth/2,nutHoleOffset,-fillet-fudge]) cube([nutHoleWidth,nutHoleHeight,nutHoleDepth]);
        translate([screwDistance/2-nutHoleWidth/2,nutHoleOffset,-fillet-fudge]) cube([nutHoleWidth,nutHoleHeight,nutHoleDepth]);
      }
    }
    // create test piece: cut away all other volume from 3 mm to the right of the nuthole and 4 mm in front of the mount plate
    if (createTestPiece) {
      if (screwCount == 1) {
        translate([nutWidth/2+3,-cutterCube/2,-cutterCube/2]) cube(cutterCube);
      } else {
        translate([-screwDistance/2+nutWidth/2+3,-cutterCube/2,-cutterCube/2]) cube(cutterCube);
      }  
      translate([-cutterCube/2,backplateThickness+4,-cutterCube/2]) cube(cutterCube);
    }
  }
}
